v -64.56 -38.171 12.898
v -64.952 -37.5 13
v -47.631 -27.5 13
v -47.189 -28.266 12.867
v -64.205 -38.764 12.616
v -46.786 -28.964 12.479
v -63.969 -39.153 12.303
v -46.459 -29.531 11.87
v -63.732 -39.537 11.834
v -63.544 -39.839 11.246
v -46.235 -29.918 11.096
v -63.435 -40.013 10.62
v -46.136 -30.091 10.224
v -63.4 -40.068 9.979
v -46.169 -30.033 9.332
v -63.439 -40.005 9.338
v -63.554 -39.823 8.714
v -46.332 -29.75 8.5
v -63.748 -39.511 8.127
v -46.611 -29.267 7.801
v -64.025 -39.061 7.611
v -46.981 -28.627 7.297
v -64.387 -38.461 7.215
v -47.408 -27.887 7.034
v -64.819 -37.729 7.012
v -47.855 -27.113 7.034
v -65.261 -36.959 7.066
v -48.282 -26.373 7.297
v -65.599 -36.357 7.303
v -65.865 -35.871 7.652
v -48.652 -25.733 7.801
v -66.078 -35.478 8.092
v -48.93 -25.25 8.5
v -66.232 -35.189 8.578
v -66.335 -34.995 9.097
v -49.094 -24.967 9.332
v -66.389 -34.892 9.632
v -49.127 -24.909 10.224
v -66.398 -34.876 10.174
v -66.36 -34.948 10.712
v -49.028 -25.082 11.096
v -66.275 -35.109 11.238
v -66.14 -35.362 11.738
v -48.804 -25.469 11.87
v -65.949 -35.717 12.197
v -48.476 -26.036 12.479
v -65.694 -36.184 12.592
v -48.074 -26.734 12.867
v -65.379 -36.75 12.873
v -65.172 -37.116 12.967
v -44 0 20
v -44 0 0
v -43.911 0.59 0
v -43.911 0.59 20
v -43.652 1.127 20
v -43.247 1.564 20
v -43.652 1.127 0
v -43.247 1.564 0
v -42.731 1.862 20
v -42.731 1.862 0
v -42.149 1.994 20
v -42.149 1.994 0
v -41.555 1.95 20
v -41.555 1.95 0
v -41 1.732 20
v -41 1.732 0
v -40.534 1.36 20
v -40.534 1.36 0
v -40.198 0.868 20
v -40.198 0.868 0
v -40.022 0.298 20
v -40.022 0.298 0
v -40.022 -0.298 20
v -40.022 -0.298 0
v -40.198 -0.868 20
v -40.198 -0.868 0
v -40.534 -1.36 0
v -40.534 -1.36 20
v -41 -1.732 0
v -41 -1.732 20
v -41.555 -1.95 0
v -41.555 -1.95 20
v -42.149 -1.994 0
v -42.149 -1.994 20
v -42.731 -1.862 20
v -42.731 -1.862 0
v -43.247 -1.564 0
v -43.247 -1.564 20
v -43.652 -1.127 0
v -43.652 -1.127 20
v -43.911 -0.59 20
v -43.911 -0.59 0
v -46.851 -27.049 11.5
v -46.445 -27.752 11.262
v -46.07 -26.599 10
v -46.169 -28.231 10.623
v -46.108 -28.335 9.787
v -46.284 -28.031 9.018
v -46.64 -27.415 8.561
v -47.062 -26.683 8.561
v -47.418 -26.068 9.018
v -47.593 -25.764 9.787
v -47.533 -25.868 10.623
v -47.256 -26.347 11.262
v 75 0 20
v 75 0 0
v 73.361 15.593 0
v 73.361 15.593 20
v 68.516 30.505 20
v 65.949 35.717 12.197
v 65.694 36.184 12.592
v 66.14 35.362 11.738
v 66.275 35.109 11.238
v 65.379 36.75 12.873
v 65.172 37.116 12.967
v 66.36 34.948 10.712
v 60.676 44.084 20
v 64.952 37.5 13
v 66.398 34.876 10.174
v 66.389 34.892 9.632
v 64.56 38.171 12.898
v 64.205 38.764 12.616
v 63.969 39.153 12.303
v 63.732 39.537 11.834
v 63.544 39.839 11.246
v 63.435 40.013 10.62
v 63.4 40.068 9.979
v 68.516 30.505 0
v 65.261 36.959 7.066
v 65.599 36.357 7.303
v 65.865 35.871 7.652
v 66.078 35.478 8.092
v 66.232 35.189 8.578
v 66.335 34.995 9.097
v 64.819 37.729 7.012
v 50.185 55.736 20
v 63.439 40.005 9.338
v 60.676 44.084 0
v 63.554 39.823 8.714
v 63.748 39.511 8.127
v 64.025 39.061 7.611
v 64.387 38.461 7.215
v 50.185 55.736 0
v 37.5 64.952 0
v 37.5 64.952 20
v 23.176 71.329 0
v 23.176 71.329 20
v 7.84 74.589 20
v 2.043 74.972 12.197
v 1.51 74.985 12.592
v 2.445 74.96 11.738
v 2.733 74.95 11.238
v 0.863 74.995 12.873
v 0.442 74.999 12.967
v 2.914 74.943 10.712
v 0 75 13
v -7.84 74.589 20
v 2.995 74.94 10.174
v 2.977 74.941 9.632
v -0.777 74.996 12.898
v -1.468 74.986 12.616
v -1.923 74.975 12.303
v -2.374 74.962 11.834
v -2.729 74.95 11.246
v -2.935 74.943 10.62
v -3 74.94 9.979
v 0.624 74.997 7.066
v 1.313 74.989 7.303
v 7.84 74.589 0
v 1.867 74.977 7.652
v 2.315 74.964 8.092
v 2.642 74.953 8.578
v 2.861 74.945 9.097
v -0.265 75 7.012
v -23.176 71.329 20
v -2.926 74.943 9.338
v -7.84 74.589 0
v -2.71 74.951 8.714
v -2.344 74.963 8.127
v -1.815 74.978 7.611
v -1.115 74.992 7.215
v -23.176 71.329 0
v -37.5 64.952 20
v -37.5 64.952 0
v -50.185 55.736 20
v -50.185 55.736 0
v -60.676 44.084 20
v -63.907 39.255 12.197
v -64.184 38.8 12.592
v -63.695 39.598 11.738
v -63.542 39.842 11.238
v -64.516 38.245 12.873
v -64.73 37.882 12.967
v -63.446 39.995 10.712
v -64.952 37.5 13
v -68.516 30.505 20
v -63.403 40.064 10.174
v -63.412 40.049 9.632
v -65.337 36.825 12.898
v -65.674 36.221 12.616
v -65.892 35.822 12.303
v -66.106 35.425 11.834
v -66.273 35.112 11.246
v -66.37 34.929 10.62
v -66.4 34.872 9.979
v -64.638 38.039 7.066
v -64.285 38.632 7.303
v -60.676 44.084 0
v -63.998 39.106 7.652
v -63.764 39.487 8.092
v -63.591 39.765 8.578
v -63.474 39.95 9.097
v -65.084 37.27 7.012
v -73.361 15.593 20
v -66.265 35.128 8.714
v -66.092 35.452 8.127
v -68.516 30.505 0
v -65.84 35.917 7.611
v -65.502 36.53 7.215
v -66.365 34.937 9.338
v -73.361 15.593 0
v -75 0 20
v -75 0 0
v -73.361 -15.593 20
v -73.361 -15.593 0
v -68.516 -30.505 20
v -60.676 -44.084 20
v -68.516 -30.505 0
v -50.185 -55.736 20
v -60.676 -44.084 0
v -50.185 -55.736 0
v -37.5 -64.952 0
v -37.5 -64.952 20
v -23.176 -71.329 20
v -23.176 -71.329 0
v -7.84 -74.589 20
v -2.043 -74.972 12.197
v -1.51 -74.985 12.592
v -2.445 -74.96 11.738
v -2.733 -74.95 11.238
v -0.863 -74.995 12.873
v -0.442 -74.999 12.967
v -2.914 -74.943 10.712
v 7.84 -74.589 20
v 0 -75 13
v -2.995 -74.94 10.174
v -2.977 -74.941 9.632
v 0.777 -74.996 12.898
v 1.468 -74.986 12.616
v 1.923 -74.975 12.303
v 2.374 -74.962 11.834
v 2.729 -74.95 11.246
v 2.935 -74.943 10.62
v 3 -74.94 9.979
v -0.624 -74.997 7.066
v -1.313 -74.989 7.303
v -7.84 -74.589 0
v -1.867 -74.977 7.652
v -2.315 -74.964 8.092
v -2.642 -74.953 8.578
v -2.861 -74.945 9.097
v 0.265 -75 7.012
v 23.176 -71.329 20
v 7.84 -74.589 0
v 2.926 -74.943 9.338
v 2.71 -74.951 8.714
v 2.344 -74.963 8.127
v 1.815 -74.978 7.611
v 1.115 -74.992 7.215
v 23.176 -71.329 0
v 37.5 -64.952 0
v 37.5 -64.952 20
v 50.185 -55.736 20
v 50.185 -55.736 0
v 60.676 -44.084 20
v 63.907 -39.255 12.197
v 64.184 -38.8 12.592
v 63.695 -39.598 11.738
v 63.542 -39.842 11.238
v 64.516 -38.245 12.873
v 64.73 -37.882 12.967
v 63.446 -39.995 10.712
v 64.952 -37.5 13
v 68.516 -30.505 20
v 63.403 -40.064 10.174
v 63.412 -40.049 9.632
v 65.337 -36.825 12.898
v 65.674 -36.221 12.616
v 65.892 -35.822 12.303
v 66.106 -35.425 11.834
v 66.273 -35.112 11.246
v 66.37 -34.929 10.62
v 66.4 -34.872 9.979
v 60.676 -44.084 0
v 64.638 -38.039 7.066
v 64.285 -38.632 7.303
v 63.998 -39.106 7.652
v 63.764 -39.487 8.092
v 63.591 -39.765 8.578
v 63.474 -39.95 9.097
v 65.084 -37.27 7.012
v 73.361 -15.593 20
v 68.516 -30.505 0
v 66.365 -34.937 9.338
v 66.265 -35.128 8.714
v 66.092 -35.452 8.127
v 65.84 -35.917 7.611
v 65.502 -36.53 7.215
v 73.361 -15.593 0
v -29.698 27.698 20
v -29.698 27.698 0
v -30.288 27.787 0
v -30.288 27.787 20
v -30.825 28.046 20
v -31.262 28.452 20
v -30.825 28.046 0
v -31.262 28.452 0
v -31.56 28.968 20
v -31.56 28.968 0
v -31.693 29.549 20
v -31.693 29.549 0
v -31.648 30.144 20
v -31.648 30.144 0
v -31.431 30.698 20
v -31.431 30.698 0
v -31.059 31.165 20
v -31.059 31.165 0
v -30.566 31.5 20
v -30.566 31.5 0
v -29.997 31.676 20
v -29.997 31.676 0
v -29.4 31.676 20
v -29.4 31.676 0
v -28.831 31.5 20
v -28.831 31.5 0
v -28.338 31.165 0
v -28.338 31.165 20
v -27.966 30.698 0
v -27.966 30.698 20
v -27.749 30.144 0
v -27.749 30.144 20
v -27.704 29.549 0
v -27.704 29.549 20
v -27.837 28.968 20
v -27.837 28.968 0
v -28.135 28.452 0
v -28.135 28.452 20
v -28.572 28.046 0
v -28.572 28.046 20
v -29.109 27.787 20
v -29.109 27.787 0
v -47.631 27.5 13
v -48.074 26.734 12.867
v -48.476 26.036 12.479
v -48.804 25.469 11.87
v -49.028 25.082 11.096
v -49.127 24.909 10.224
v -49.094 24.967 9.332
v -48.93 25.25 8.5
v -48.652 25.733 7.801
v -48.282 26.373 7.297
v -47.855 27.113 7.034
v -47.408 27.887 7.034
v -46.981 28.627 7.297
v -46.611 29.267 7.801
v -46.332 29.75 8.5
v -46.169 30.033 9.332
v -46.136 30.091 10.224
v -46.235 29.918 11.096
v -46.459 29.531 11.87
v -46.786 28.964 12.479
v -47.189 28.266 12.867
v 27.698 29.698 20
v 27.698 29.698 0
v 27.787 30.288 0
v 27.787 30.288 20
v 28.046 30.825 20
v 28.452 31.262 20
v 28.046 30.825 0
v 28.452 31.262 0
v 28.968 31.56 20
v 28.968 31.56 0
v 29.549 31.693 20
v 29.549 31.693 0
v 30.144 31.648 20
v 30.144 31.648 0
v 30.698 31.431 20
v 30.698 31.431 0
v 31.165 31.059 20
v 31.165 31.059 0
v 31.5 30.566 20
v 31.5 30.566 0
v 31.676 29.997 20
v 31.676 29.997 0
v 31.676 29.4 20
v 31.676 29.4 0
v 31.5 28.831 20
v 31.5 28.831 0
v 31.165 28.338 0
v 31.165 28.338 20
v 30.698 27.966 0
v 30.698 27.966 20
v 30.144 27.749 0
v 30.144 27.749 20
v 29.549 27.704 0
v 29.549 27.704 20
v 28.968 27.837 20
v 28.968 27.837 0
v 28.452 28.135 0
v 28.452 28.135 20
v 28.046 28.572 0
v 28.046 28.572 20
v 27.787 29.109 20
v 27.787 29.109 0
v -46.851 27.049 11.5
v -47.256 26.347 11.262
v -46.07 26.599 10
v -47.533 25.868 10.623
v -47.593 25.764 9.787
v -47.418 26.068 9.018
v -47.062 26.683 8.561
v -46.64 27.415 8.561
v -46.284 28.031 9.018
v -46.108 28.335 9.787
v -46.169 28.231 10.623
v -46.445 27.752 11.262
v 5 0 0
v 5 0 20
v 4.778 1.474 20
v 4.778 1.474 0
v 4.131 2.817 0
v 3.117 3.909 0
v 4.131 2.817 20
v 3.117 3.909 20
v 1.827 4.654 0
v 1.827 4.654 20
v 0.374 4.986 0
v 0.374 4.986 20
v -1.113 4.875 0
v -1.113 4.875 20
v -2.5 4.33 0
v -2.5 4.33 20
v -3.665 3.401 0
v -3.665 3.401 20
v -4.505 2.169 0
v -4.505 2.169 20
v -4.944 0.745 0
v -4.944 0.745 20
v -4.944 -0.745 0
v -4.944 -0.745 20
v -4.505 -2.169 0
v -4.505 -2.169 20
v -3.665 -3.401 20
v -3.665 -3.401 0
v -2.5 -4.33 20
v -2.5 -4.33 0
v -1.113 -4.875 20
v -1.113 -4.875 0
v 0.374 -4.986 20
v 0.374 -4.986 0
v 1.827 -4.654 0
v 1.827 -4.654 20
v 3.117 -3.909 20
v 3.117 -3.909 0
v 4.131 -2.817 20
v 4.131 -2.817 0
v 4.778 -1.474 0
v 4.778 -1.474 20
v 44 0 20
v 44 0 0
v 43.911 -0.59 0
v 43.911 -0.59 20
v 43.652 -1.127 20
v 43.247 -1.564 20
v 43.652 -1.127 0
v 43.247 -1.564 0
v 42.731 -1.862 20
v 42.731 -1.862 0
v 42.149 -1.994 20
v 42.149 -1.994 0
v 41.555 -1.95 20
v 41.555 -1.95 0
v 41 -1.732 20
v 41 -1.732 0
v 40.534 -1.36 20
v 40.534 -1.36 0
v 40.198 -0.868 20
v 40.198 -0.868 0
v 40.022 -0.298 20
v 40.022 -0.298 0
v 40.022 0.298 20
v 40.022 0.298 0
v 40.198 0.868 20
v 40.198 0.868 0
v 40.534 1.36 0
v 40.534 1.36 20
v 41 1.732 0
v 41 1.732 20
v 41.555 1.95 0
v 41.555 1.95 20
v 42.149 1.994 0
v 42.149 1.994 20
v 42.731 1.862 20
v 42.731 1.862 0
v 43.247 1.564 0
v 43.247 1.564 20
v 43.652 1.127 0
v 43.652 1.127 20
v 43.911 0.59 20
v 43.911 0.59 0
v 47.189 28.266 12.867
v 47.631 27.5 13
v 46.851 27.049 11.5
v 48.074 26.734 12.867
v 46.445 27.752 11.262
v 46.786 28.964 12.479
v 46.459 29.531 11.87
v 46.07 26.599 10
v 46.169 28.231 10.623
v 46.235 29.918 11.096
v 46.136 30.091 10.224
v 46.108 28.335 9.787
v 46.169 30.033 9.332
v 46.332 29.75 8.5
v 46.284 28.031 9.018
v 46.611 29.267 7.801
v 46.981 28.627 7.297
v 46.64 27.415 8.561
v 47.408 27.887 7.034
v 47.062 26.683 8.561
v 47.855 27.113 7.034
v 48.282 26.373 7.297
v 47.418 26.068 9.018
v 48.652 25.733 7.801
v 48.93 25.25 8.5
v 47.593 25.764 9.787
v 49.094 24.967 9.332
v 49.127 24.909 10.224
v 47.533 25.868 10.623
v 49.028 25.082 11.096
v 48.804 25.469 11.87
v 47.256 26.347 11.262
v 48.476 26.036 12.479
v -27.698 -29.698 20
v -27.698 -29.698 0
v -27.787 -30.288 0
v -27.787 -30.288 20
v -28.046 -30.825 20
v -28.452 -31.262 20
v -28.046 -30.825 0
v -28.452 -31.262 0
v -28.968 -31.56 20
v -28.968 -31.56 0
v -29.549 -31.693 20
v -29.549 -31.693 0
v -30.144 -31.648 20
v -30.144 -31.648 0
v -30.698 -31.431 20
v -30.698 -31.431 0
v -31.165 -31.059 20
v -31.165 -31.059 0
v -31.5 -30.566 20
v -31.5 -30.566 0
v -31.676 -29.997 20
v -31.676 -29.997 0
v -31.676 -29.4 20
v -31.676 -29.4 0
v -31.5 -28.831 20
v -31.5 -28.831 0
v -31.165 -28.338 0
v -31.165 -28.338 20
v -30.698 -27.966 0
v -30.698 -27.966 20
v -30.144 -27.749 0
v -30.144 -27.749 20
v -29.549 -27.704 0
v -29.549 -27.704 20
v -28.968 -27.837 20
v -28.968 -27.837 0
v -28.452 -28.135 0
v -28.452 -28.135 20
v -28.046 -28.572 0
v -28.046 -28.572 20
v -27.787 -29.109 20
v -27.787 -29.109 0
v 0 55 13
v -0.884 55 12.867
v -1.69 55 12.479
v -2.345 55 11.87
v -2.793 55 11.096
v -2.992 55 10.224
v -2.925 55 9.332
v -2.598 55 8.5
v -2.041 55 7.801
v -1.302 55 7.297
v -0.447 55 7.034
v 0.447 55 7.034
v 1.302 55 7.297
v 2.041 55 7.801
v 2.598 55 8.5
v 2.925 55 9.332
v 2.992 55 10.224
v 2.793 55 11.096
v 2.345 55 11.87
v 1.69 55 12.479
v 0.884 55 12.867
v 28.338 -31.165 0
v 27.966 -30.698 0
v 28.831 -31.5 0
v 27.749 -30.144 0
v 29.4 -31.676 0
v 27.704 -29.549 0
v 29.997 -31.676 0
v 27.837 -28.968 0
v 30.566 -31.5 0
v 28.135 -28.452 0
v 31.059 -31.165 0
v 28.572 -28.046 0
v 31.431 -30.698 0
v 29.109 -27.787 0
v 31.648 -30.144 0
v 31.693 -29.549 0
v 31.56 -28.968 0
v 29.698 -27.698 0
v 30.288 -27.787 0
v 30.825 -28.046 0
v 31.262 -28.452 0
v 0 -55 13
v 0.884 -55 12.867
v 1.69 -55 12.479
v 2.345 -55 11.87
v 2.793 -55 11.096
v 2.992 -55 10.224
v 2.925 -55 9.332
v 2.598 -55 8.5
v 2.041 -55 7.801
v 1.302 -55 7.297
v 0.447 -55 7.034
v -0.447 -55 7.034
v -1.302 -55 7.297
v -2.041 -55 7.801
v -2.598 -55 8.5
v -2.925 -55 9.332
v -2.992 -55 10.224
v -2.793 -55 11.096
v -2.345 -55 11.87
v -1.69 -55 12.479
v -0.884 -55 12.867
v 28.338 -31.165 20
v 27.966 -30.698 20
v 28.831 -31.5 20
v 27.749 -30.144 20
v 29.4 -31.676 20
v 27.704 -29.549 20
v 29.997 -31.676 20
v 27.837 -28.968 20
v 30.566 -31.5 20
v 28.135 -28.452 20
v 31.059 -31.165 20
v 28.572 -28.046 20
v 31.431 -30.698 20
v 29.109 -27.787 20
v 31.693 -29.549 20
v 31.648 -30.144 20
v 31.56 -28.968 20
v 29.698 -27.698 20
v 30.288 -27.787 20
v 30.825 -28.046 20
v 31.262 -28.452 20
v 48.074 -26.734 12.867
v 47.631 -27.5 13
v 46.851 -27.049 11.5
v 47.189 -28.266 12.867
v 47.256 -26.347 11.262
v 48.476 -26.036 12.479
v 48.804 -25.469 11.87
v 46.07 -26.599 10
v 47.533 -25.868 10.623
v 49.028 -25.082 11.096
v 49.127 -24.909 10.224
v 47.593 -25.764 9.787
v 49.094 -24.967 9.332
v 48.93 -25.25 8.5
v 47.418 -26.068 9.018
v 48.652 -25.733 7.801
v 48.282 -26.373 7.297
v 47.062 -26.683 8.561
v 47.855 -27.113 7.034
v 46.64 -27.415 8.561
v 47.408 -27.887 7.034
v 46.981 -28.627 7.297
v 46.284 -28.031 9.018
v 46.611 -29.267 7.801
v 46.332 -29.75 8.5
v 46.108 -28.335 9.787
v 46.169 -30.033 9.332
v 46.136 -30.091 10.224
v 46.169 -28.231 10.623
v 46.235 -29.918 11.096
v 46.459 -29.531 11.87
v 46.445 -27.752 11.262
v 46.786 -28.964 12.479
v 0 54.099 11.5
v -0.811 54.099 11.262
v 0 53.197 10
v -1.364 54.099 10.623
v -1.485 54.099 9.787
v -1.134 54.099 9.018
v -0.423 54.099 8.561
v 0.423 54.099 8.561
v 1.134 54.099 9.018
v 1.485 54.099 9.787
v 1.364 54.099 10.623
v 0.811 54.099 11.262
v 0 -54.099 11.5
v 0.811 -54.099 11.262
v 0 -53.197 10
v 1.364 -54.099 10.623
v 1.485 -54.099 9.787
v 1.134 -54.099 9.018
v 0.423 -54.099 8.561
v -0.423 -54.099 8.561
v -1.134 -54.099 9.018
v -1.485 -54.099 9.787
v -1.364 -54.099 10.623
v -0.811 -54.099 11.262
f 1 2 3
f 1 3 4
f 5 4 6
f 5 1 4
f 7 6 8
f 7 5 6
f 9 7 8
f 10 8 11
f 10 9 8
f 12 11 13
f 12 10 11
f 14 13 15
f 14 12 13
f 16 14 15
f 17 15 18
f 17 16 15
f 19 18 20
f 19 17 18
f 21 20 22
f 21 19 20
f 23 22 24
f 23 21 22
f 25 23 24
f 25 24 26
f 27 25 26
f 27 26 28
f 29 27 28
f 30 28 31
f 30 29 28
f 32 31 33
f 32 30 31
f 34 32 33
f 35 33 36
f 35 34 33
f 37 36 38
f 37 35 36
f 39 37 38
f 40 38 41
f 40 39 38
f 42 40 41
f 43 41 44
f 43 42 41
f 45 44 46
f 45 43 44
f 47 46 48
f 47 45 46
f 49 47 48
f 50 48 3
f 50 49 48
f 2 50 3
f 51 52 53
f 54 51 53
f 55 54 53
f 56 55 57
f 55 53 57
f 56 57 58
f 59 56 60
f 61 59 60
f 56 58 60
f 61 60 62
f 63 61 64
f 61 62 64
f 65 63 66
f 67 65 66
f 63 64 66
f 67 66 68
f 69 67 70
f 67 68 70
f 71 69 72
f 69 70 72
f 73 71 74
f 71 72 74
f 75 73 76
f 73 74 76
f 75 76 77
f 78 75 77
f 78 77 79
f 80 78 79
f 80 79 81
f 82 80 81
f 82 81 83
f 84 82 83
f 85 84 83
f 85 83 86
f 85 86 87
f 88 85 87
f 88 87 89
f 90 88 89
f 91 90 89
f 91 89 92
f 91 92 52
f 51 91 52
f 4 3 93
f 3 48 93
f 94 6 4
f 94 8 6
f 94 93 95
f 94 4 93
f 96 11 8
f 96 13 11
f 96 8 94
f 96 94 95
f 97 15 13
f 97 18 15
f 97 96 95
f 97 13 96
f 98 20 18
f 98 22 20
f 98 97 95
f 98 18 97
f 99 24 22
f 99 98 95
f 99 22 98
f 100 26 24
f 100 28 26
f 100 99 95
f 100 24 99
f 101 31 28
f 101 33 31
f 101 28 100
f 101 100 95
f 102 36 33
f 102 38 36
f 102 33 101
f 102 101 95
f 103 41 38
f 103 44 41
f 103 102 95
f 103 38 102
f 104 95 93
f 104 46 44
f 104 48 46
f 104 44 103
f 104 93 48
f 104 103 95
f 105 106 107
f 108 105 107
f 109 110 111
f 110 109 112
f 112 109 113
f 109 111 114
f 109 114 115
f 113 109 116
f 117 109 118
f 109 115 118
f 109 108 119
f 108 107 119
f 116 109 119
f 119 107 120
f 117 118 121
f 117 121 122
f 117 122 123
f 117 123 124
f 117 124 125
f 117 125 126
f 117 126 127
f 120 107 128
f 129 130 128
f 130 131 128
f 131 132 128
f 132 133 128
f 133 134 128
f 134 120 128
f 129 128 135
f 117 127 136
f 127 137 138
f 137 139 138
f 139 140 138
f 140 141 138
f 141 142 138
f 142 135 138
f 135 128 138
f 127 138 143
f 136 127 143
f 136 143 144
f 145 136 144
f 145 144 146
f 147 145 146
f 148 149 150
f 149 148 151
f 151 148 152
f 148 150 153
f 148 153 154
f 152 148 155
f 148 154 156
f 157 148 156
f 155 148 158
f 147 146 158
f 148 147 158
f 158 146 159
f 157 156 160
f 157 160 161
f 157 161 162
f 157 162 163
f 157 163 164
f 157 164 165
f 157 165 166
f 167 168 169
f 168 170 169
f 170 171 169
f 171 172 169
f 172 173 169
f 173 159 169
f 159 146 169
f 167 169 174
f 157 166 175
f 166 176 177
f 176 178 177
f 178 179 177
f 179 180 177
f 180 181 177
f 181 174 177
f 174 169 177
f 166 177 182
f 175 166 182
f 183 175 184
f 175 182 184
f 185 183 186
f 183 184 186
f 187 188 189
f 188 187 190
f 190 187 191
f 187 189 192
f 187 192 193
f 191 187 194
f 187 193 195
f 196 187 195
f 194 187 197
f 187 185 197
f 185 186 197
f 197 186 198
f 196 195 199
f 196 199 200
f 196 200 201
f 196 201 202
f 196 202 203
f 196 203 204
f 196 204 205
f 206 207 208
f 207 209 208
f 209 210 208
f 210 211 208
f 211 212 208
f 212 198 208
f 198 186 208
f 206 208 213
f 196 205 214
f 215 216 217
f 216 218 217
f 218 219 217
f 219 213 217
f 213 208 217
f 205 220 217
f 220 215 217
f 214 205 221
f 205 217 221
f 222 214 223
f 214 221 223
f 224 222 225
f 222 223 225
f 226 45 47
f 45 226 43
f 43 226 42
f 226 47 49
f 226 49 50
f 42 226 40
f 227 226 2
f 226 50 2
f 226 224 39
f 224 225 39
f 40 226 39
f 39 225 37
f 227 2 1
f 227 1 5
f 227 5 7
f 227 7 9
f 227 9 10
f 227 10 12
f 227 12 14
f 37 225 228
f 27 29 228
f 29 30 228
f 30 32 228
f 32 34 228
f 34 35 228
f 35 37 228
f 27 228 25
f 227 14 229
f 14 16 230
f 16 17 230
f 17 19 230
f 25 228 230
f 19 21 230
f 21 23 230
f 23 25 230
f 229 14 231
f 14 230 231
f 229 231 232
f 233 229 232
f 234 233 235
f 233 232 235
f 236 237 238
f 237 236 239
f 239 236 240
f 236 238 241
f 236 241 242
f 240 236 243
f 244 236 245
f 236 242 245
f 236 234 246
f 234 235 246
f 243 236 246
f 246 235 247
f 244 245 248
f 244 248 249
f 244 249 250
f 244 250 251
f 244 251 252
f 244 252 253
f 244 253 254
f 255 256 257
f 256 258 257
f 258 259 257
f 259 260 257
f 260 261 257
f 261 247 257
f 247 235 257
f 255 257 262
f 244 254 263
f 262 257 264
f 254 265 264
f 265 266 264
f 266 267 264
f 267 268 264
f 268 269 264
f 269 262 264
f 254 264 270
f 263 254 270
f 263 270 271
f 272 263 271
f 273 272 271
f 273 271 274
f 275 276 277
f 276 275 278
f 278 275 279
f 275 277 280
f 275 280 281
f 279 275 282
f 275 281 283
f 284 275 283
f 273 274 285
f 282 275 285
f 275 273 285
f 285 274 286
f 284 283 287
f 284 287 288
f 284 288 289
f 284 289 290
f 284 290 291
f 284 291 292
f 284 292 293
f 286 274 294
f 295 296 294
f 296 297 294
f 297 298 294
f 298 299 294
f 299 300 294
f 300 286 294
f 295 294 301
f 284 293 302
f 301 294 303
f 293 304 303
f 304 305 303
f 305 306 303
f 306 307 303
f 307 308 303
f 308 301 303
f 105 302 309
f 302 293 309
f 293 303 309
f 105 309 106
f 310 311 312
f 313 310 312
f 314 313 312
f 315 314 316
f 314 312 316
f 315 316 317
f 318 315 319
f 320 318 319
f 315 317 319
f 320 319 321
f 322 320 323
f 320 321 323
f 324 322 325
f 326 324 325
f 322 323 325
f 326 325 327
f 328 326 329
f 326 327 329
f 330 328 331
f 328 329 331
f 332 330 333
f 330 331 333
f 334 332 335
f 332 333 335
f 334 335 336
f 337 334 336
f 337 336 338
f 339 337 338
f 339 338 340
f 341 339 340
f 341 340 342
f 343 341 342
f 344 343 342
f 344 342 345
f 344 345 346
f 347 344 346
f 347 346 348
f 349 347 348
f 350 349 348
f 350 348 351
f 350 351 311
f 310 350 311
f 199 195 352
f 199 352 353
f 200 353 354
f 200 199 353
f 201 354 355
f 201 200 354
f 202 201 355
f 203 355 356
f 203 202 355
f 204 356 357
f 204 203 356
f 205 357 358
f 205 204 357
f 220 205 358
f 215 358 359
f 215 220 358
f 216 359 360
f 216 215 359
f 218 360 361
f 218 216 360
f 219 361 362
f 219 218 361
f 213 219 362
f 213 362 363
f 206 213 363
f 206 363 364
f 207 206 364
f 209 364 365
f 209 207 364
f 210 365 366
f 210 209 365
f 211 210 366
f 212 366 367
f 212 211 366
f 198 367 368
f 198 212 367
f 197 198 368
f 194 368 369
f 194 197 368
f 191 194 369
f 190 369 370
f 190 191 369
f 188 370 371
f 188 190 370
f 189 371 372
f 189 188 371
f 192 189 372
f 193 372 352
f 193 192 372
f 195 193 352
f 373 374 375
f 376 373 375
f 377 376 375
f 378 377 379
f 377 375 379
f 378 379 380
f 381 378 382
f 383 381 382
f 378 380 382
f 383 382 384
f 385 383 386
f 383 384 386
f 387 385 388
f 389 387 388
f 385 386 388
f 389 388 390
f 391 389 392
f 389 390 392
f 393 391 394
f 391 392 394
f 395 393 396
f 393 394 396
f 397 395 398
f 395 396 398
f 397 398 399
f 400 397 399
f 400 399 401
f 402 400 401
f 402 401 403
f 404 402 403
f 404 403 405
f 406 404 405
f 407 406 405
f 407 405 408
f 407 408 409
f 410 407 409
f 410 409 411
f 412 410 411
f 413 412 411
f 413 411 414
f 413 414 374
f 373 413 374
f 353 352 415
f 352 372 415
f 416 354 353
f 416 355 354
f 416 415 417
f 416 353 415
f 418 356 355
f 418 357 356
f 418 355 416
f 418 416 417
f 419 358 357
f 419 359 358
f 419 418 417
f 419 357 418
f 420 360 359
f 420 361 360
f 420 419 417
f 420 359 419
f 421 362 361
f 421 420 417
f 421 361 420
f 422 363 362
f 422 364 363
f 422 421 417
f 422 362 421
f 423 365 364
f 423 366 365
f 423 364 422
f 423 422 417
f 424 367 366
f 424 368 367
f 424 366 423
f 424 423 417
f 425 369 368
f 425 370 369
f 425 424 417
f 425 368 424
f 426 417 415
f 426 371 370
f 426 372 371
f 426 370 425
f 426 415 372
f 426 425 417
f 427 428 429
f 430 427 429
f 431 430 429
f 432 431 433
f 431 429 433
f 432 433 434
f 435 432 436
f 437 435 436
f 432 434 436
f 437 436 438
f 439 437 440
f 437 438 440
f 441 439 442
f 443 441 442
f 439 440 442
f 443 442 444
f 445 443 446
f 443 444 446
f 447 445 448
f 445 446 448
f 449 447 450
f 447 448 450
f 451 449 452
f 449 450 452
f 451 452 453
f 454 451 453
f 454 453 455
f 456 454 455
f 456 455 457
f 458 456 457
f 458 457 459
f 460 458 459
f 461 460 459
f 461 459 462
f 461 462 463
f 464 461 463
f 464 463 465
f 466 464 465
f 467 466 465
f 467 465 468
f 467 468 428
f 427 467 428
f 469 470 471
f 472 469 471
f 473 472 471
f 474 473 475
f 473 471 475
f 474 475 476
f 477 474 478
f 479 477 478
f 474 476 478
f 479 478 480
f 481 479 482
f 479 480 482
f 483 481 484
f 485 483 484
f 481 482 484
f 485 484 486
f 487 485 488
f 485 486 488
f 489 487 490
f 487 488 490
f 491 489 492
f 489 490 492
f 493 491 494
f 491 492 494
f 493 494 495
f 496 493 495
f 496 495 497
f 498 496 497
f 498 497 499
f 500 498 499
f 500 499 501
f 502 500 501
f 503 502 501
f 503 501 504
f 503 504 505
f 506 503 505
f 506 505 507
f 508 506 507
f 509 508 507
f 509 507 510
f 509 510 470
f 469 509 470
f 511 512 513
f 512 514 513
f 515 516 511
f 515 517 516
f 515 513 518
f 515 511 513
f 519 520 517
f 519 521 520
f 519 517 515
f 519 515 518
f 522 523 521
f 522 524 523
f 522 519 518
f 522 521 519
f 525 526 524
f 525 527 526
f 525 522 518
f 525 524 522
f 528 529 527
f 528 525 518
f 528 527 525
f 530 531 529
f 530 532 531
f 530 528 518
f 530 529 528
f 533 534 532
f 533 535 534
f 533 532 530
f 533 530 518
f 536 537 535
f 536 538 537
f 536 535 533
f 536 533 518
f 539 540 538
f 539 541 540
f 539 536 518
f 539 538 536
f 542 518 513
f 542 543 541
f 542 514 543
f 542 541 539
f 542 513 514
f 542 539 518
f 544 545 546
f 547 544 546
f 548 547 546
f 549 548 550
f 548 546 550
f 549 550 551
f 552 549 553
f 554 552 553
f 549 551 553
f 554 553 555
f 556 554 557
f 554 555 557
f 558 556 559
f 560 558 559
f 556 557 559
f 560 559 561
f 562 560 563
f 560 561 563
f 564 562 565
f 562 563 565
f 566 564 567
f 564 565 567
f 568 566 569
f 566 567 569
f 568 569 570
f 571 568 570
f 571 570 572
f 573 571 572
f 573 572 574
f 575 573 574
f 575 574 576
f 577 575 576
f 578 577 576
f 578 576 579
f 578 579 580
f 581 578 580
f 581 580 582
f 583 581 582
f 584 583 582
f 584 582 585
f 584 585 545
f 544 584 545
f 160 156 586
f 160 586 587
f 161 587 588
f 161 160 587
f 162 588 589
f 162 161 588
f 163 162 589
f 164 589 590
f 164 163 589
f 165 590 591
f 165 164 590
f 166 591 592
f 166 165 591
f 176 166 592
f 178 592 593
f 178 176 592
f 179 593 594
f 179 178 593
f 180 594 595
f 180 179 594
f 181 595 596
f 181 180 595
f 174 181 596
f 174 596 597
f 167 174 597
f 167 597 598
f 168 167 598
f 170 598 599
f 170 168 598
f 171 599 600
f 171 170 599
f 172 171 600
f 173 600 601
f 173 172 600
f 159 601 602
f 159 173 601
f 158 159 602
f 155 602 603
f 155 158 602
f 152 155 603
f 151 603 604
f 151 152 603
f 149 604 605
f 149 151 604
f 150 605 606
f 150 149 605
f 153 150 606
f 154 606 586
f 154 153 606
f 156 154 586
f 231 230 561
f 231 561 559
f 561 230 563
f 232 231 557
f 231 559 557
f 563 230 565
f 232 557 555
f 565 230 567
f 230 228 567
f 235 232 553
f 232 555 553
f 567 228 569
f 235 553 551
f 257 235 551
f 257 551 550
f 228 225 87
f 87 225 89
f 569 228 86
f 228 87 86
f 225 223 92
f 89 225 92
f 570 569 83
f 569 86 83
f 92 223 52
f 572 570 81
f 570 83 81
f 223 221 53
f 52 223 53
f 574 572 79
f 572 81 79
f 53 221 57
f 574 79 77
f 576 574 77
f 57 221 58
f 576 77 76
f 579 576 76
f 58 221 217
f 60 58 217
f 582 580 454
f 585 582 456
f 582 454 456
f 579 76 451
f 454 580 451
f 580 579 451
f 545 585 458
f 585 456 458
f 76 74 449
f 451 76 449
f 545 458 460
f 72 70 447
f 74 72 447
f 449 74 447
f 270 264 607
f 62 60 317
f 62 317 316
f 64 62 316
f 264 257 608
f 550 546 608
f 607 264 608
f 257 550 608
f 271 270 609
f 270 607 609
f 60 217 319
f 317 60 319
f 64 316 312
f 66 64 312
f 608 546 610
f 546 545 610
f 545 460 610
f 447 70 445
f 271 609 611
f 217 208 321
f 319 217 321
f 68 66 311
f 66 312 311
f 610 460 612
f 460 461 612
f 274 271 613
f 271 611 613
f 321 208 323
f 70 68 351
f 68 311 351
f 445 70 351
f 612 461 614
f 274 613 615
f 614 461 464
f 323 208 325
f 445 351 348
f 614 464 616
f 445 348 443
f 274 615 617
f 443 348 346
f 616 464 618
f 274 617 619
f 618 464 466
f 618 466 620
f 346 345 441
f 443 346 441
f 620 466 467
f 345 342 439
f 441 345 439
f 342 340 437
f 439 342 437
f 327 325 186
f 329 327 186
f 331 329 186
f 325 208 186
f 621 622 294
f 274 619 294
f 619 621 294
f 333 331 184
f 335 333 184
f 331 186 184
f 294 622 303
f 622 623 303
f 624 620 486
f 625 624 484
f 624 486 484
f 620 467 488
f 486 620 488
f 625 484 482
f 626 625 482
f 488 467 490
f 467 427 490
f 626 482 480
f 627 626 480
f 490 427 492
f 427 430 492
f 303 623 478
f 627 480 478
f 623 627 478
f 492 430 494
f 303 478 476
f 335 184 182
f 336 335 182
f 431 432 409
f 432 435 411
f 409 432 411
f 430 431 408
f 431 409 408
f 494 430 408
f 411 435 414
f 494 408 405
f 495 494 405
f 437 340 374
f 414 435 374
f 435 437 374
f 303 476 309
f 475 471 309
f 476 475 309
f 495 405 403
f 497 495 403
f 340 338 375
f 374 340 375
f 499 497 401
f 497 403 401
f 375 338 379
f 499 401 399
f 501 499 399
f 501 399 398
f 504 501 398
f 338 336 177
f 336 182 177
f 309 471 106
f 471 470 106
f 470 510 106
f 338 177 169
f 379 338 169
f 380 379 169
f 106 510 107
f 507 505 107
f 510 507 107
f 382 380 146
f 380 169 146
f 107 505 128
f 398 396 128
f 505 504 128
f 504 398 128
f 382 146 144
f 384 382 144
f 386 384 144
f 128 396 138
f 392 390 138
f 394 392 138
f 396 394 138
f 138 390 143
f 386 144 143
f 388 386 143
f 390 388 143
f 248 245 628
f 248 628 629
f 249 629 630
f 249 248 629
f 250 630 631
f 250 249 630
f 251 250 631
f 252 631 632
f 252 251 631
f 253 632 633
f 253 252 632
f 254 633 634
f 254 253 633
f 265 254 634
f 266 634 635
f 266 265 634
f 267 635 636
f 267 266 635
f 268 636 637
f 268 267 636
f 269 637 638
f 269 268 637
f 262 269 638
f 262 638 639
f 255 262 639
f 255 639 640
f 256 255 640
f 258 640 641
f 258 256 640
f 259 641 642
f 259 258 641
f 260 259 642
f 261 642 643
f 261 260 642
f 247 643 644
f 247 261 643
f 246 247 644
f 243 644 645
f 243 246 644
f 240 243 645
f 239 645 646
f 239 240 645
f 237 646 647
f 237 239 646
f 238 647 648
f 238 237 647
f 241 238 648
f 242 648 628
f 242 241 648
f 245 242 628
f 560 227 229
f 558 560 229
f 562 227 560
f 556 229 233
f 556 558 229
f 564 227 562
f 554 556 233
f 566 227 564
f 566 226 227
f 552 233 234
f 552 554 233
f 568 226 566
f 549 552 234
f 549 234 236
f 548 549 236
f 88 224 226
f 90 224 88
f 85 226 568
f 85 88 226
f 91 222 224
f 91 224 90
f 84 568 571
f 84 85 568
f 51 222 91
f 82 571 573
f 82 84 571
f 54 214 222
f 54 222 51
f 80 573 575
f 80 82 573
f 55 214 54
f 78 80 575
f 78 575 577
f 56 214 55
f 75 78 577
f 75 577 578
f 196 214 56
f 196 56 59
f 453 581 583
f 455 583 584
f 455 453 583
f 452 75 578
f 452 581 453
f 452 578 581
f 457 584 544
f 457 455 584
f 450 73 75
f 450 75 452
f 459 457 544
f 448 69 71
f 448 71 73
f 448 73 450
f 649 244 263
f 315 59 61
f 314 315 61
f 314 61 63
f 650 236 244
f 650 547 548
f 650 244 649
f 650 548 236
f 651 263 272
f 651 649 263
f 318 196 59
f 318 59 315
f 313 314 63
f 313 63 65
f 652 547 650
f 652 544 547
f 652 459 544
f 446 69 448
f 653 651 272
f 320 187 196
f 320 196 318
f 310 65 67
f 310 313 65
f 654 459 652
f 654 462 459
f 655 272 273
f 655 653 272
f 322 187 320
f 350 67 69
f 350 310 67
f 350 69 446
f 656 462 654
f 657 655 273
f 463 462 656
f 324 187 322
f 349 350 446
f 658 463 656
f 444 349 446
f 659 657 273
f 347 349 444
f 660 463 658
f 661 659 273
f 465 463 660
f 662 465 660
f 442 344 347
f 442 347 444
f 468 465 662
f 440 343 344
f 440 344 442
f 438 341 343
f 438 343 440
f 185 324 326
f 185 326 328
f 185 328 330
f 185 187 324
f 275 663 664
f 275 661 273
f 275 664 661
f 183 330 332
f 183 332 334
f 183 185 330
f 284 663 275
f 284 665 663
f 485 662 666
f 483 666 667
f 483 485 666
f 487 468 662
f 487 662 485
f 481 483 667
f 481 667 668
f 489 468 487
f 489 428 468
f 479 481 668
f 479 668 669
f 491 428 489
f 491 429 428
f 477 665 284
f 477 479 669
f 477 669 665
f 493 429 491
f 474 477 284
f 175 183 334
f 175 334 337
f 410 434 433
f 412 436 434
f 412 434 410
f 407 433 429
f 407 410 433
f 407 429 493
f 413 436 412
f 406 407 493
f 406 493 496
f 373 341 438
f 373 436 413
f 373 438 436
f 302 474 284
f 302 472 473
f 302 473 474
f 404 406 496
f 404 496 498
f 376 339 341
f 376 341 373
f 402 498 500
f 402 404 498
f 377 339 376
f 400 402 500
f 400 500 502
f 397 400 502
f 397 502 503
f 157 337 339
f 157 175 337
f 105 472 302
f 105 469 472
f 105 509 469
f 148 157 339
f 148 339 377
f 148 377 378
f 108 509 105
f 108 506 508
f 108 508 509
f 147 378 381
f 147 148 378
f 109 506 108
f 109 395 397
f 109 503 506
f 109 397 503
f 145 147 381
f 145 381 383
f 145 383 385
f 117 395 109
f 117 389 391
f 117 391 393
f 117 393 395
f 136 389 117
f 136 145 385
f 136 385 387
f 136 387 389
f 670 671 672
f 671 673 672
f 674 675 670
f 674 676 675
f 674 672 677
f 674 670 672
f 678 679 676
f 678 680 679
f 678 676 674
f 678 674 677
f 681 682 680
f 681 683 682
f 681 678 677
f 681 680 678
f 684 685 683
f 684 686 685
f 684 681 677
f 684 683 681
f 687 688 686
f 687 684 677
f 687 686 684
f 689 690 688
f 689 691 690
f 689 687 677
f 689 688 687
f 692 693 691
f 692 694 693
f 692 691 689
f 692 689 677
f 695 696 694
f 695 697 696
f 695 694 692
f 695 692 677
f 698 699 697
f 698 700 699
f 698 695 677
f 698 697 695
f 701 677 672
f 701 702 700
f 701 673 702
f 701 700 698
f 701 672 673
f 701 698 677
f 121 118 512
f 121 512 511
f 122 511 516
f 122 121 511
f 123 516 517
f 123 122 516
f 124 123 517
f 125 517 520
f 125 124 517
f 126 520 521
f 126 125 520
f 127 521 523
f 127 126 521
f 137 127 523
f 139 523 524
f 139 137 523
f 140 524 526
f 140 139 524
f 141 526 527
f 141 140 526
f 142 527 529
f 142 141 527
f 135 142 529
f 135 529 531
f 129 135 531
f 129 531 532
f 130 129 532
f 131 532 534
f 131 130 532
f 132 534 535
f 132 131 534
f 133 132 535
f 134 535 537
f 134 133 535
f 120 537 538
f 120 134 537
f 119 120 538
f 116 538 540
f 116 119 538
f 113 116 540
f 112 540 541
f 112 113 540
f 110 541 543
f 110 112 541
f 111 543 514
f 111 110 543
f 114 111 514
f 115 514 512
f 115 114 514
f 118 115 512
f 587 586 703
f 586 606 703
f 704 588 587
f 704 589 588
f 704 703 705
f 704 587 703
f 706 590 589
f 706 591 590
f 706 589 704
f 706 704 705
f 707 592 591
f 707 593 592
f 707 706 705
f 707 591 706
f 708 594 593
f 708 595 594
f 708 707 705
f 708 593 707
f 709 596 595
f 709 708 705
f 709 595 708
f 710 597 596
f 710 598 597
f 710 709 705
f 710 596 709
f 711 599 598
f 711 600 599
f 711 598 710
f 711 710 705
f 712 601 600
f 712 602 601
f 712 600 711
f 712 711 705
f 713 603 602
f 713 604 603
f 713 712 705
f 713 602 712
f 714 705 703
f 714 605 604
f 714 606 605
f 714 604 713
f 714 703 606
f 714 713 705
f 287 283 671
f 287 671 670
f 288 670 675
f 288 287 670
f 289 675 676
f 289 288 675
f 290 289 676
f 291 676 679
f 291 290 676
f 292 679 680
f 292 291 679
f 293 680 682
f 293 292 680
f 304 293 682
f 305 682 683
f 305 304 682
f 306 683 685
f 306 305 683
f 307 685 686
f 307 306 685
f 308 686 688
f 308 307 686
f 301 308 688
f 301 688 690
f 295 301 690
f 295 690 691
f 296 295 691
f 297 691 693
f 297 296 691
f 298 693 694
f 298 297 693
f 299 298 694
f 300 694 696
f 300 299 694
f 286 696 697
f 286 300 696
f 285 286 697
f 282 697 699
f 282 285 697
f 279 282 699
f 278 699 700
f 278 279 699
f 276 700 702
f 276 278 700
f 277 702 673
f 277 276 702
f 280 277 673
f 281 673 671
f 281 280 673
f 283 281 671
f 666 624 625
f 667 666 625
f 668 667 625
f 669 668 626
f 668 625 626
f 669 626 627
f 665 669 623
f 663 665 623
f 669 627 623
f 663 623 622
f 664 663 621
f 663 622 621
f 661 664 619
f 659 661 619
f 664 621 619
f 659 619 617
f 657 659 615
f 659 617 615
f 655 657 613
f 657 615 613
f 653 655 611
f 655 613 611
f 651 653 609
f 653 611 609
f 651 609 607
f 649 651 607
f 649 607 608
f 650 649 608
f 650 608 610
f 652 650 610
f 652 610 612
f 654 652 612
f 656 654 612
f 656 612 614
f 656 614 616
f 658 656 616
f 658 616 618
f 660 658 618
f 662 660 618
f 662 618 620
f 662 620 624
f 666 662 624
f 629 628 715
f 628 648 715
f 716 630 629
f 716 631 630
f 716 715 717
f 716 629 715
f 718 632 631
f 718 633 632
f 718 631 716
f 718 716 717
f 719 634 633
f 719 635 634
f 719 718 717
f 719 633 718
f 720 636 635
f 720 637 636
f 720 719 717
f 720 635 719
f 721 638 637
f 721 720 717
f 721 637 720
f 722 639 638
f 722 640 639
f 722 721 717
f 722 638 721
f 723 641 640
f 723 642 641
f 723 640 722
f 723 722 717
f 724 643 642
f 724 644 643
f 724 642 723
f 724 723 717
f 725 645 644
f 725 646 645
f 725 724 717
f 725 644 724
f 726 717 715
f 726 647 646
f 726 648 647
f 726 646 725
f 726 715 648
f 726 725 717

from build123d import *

# Parameters (mm, degrees)
SKETCH_1_R               = 75
EXTRUDE_1_DEPTH          = 20
F_4_0MM_1_D              = 4
PATTERN_CIRCULAR_1_COUNT = 4
PATTERN_CIRCULAR_2_COUNT = 6
CUT_EXTRUDE_1_REACH      = 109.935
SKETCH_7_R               = 5
F_4_0MM_2_D              = 4
PATTERN_CIRCULAR_3_COUNT = 2


with BuildPart() as part:
    # 草圖1 → 填料-伸長1 (new body)
    with BuildSketch(Plane.XY):
        Circle(SKETCH_1_R)
    extrude(amount=EXTRUDE_1_DEPTH)

    # Ø4.0mm 定位孔1 (through all)
    with Locations(Plane.XY.offset(20)):
        with Locations((29.69848481, 29.69848481)):
            f_4_0mm_1 = Hole(F_4_0MM_1_D / 2)

    # 環狀複製排列1: Ø4.0mm 定位孔1 ×4 about axis
    pattern_circular_1_axis = Axis((0, 0, 0), (0, 0, 1))
    for i in range(1, PATTERN_CIRCULAR_1_COUNT):
        add(f_4_0mm_1.rotate(pattern_circular_1_axis, i * 360 / PATTERN_CIRCULAR_1_COUNT), mode=Mode.SUBTRACT)

    # 草圖6 → Ø6.0mm 定位孔1 (revolve, cut)
    with BuildSketch(Plane(origin=(0, 75, 10), x_dir=(0, 0, 1), z_dir=(1, 0, 0))):
        Polygon((0, 0), (0, 21.802581857), (3, 20), (3, 0), align=None)
    f_6_0mm_1 = revolve(axis=Axis((0, 81.35, 10), (0, -1, 0)), mode=Mode.SUBTRACT)

    # 環狀複製排列2: Ø6.0mm 定位孔1 ×6 about axis
    pattern_circular_2_axis = Axis((0, 0, -88.99), (0, 0, 1))
    for i in range(1, PATTERN_CIRCULAR_2_COUNT):
        add(f_6_0mm_1.rotate(pattern_circular_2_axis, i * 360 / PATTERN_CIRCULAR_2_COUNT), mode=Mode.SUBTRACT)

    # 草圖7 → 除料-伸長1 (cut, up to next)
    with BuildSketch(Plane.XY.offset(20), mode=Mode.PRIVATE) as cut_extrude_1_sk1:
        Circle(SKETCH_7_R)
    cut_extrude_1_tool1 = extrude(cut_extrude_1_sk1.sketch, amount=-CUT_EXTRUDE_1_REACH, mode=Mode.PRIVATE) & part.part
    add(cut_extrude_1_tool1.solids().sort_by_distance((0, 0, 20))[0], mode=Mode.SUBTRACT)

    # Ø4.0mm 定位孔2 (through all)
    with Locations(Plane.XY.offset(20)):
        with Locations((-42, 0)):
            f_4_0mm_2 = Hole(F_4_0MM_2_D / 2)

    # 環狀複製排列3: Ø4.0mm 定位孔2 ×2 about axis
    pattern_circular_3_axis = Axis((0, 0, 0), (0, 0, 1))
    for i in range(1, PATTERN_CIRCULAR_3_COUNT):
        add(f_4_0mm_2.rotate(pattern_circular_3_axis, i * 360 / PATTERN_CIRCULAR_3_COUNT), mode=Mode.SUBTRACT)


solid = part.part
